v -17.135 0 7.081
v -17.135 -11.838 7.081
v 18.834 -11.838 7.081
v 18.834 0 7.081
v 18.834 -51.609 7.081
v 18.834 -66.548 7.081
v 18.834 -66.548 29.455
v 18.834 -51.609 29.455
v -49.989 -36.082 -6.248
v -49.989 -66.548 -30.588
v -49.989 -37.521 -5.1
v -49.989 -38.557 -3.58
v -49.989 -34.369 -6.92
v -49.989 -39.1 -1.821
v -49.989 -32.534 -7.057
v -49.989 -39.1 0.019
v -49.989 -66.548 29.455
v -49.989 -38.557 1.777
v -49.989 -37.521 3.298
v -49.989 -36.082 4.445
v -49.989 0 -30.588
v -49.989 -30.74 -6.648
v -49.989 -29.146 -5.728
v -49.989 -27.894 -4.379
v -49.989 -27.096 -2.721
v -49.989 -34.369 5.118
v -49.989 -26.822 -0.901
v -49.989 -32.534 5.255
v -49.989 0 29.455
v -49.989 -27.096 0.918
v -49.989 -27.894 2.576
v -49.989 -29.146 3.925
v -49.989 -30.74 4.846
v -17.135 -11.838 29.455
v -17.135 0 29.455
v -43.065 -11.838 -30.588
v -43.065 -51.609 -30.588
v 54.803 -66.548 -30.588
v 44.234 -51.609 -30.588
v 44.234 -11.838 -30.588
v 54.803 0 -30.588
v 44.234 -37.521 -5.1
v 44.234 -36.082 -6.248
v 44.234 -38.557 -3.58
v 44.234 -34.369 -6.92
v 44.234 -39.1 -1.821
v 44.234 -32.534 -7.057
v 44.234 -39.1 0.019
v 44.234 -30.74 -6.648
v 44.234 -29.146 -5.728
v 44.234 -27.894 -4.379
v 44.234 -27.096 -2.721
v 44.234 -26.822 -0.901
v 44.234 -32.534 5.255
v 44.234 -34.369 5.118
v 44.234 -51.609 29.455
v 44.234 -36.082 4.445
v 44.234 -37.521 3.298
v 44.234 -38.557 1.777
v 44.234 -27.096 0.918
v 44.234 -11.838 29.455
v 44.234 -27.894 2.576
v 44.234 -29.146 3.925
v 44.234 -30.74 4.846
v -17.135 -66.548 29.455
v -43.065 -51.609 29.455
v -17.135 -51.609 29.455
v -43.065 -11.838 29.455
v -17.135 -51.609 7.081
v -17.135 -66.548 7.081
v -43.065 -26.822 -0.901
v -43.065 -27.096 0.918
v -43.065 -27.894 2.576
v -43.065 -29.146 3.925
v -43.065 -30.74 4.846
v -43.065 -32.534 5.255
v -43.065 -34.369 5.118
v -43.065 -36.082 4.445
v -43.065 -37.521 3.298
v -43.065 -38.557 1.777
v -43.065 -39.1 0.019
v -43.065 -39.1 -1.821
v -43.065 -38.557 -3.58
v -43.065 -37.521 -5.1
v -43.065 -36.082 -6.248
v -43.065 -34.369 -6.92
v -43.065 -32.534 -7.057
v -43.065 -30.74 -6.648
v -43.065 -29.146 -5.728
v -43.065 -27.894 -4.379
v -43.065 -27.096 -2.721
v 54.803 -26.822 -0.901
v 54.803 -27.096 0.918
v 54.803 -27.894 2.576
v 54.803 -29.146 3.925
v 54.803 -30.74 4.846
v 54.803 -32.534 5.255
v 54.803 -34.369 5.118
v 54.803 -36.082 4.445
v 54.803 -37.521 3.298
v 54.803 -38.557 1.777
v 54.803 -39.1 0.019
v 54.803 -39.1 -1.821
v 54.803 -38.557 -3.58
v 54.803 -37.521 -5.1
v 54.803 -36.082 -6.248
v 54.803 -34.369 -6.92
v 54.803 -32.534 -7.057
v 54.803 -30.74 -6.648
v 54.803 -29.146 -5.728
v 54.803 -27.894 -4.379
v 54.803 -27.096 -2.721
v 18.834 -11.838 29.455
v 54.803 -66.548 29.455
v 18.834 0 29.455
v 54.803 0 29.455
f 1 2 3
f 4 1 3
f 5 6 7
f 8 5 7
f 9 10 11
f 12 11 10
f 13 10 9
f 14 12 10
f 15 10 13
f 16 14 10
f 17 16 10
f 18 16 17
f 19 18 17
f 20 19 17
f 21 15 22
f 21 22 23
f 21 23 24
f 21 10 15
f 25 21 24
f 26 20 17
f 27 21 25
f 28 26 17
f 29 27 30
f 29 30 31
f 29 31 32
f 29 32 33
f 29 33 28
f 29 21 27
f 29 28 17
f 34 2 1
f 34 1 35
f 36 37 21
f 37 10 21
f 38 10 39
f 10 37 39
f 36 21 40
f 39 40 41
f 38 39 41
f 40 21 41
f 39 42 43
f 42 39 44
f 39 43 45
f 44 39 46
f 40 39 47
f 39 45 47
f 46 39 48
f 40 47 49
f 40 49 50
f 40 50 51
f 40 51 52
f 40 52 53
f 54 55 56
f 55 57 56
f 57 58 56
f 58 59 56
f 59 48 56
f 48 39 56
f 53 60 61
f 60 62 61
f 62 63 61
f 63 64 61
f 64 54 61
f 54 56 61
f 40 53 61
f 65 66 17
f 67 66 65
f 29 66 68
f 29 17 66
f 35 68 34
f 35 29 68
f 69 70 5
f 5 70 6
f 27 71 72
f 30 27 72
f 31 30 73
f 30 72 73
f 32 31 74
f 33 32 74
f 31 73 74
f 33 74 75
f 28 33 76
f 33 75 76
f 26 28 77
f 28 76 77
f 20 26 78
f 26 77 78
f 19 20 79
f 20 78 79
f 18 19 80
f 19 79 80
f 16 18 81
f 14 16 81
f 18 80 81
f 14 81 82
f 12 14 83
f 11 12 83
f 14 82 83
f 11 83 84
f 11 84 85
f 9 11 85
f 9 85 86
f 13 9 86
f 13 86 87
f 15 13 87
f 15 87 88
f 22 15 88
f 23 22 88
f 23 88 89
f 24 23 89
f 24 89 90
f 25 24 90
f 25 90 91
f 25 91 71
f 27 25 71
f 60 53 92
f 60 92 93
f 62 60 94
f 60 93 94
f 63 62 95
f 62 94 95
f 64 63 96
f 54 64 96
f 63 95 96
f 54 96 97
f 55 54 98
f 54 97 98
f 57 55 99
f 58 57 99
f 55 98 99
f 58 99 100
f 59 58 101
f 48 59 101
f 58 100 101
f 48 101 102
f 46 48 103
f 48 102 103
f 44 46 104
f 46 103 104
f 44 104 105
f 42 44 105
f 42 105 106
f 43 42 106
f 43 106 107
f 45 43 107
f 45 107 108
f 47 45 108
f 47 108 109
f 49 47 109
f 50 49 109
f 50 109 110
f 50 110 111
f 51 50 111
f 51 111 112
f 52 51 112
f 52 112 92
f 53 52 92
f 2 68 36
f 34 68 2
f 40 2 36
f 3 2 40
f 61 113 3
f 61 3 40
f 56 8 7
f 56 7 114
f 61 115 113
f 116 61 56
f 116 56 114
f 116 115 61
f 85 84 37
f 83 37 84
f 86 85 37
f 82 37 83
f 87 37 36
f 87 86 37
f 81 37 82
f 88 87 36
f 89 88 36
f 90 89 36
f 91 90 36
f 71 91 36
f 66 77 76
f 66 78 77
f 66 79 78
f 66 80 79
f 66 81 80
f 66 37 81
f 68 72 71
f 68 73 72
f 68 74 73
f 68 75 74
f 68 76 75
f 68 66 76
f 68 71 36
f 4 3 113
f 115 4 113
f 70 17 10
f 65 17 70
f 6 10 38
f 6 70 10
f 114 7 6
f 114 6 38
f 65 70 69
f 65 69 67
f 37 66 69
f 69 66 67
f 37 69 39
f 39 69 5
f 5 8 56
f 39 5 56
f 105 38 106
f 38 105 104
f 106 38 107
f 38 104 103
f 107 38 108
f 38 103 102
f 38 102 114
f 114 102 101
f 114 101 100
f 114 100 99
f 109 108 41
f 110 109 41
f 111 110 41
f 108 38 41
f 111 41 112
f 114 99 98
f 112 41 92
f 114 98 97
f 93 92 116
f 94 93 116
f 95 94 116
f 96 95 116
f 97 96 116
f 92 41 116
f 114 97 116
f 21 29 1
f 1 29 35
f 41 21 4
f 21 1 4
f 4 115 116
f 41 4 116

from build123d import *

# Parameters (mm, degrees)
F0_W     = 104.791857
F0_H     = 60.042905
F1_DEPTH = 66.548
F3_W     = 87.298889
F3_H     = 39.771117
F4_DEPTH = 60.043905
F2_W     = 35.969097
F2_H     = 22.374479
F5_DEPTH = 66.549
F6_R     = 6.173541
F7_DEPTH = 104.792857


with BuildPart() as f1:
    # F0 (on Front) → F1 (new body)
    with BuildSketch(Plane.XZ):
        with Locations((2.407379, -0.566443)):
            Rectangle(F0_W, F0_H)
    extrude(amount=F1_DEPTH)

    # F3 (on face) → F4 (cut, through all)
    with BuildSketch(Plane.XY.offset(29.45501)):
        with Locations((0.584687, -31.723138)):
            Rectangle(F3_W, F3_H)
    extrude(amount=-F4_DEPTH, mode=Mode.SUBTRACT)

    # F2 (on face) → F5 (cut, through all)
    with BuildSketch(Plane.XZ.offset(66.548)):
        with Locations((0.849664, 18.26777)):
            Rectangle(F2_W, F2_H)
    extrude(amount=-F5_DEPTH, mode=Mode.SUBTRACT)

    # F6 (on face) → F7 (cut, through all)
    with BuildSketch(Plane.YZ.offset(54.803308)):
        with Locations((-32.995041, -0.901195)):
            Circle(F6_R)
    extrude(amount=-F7_DEPTH, mode=Mode.SUBTRACT)


solid = f1.part
